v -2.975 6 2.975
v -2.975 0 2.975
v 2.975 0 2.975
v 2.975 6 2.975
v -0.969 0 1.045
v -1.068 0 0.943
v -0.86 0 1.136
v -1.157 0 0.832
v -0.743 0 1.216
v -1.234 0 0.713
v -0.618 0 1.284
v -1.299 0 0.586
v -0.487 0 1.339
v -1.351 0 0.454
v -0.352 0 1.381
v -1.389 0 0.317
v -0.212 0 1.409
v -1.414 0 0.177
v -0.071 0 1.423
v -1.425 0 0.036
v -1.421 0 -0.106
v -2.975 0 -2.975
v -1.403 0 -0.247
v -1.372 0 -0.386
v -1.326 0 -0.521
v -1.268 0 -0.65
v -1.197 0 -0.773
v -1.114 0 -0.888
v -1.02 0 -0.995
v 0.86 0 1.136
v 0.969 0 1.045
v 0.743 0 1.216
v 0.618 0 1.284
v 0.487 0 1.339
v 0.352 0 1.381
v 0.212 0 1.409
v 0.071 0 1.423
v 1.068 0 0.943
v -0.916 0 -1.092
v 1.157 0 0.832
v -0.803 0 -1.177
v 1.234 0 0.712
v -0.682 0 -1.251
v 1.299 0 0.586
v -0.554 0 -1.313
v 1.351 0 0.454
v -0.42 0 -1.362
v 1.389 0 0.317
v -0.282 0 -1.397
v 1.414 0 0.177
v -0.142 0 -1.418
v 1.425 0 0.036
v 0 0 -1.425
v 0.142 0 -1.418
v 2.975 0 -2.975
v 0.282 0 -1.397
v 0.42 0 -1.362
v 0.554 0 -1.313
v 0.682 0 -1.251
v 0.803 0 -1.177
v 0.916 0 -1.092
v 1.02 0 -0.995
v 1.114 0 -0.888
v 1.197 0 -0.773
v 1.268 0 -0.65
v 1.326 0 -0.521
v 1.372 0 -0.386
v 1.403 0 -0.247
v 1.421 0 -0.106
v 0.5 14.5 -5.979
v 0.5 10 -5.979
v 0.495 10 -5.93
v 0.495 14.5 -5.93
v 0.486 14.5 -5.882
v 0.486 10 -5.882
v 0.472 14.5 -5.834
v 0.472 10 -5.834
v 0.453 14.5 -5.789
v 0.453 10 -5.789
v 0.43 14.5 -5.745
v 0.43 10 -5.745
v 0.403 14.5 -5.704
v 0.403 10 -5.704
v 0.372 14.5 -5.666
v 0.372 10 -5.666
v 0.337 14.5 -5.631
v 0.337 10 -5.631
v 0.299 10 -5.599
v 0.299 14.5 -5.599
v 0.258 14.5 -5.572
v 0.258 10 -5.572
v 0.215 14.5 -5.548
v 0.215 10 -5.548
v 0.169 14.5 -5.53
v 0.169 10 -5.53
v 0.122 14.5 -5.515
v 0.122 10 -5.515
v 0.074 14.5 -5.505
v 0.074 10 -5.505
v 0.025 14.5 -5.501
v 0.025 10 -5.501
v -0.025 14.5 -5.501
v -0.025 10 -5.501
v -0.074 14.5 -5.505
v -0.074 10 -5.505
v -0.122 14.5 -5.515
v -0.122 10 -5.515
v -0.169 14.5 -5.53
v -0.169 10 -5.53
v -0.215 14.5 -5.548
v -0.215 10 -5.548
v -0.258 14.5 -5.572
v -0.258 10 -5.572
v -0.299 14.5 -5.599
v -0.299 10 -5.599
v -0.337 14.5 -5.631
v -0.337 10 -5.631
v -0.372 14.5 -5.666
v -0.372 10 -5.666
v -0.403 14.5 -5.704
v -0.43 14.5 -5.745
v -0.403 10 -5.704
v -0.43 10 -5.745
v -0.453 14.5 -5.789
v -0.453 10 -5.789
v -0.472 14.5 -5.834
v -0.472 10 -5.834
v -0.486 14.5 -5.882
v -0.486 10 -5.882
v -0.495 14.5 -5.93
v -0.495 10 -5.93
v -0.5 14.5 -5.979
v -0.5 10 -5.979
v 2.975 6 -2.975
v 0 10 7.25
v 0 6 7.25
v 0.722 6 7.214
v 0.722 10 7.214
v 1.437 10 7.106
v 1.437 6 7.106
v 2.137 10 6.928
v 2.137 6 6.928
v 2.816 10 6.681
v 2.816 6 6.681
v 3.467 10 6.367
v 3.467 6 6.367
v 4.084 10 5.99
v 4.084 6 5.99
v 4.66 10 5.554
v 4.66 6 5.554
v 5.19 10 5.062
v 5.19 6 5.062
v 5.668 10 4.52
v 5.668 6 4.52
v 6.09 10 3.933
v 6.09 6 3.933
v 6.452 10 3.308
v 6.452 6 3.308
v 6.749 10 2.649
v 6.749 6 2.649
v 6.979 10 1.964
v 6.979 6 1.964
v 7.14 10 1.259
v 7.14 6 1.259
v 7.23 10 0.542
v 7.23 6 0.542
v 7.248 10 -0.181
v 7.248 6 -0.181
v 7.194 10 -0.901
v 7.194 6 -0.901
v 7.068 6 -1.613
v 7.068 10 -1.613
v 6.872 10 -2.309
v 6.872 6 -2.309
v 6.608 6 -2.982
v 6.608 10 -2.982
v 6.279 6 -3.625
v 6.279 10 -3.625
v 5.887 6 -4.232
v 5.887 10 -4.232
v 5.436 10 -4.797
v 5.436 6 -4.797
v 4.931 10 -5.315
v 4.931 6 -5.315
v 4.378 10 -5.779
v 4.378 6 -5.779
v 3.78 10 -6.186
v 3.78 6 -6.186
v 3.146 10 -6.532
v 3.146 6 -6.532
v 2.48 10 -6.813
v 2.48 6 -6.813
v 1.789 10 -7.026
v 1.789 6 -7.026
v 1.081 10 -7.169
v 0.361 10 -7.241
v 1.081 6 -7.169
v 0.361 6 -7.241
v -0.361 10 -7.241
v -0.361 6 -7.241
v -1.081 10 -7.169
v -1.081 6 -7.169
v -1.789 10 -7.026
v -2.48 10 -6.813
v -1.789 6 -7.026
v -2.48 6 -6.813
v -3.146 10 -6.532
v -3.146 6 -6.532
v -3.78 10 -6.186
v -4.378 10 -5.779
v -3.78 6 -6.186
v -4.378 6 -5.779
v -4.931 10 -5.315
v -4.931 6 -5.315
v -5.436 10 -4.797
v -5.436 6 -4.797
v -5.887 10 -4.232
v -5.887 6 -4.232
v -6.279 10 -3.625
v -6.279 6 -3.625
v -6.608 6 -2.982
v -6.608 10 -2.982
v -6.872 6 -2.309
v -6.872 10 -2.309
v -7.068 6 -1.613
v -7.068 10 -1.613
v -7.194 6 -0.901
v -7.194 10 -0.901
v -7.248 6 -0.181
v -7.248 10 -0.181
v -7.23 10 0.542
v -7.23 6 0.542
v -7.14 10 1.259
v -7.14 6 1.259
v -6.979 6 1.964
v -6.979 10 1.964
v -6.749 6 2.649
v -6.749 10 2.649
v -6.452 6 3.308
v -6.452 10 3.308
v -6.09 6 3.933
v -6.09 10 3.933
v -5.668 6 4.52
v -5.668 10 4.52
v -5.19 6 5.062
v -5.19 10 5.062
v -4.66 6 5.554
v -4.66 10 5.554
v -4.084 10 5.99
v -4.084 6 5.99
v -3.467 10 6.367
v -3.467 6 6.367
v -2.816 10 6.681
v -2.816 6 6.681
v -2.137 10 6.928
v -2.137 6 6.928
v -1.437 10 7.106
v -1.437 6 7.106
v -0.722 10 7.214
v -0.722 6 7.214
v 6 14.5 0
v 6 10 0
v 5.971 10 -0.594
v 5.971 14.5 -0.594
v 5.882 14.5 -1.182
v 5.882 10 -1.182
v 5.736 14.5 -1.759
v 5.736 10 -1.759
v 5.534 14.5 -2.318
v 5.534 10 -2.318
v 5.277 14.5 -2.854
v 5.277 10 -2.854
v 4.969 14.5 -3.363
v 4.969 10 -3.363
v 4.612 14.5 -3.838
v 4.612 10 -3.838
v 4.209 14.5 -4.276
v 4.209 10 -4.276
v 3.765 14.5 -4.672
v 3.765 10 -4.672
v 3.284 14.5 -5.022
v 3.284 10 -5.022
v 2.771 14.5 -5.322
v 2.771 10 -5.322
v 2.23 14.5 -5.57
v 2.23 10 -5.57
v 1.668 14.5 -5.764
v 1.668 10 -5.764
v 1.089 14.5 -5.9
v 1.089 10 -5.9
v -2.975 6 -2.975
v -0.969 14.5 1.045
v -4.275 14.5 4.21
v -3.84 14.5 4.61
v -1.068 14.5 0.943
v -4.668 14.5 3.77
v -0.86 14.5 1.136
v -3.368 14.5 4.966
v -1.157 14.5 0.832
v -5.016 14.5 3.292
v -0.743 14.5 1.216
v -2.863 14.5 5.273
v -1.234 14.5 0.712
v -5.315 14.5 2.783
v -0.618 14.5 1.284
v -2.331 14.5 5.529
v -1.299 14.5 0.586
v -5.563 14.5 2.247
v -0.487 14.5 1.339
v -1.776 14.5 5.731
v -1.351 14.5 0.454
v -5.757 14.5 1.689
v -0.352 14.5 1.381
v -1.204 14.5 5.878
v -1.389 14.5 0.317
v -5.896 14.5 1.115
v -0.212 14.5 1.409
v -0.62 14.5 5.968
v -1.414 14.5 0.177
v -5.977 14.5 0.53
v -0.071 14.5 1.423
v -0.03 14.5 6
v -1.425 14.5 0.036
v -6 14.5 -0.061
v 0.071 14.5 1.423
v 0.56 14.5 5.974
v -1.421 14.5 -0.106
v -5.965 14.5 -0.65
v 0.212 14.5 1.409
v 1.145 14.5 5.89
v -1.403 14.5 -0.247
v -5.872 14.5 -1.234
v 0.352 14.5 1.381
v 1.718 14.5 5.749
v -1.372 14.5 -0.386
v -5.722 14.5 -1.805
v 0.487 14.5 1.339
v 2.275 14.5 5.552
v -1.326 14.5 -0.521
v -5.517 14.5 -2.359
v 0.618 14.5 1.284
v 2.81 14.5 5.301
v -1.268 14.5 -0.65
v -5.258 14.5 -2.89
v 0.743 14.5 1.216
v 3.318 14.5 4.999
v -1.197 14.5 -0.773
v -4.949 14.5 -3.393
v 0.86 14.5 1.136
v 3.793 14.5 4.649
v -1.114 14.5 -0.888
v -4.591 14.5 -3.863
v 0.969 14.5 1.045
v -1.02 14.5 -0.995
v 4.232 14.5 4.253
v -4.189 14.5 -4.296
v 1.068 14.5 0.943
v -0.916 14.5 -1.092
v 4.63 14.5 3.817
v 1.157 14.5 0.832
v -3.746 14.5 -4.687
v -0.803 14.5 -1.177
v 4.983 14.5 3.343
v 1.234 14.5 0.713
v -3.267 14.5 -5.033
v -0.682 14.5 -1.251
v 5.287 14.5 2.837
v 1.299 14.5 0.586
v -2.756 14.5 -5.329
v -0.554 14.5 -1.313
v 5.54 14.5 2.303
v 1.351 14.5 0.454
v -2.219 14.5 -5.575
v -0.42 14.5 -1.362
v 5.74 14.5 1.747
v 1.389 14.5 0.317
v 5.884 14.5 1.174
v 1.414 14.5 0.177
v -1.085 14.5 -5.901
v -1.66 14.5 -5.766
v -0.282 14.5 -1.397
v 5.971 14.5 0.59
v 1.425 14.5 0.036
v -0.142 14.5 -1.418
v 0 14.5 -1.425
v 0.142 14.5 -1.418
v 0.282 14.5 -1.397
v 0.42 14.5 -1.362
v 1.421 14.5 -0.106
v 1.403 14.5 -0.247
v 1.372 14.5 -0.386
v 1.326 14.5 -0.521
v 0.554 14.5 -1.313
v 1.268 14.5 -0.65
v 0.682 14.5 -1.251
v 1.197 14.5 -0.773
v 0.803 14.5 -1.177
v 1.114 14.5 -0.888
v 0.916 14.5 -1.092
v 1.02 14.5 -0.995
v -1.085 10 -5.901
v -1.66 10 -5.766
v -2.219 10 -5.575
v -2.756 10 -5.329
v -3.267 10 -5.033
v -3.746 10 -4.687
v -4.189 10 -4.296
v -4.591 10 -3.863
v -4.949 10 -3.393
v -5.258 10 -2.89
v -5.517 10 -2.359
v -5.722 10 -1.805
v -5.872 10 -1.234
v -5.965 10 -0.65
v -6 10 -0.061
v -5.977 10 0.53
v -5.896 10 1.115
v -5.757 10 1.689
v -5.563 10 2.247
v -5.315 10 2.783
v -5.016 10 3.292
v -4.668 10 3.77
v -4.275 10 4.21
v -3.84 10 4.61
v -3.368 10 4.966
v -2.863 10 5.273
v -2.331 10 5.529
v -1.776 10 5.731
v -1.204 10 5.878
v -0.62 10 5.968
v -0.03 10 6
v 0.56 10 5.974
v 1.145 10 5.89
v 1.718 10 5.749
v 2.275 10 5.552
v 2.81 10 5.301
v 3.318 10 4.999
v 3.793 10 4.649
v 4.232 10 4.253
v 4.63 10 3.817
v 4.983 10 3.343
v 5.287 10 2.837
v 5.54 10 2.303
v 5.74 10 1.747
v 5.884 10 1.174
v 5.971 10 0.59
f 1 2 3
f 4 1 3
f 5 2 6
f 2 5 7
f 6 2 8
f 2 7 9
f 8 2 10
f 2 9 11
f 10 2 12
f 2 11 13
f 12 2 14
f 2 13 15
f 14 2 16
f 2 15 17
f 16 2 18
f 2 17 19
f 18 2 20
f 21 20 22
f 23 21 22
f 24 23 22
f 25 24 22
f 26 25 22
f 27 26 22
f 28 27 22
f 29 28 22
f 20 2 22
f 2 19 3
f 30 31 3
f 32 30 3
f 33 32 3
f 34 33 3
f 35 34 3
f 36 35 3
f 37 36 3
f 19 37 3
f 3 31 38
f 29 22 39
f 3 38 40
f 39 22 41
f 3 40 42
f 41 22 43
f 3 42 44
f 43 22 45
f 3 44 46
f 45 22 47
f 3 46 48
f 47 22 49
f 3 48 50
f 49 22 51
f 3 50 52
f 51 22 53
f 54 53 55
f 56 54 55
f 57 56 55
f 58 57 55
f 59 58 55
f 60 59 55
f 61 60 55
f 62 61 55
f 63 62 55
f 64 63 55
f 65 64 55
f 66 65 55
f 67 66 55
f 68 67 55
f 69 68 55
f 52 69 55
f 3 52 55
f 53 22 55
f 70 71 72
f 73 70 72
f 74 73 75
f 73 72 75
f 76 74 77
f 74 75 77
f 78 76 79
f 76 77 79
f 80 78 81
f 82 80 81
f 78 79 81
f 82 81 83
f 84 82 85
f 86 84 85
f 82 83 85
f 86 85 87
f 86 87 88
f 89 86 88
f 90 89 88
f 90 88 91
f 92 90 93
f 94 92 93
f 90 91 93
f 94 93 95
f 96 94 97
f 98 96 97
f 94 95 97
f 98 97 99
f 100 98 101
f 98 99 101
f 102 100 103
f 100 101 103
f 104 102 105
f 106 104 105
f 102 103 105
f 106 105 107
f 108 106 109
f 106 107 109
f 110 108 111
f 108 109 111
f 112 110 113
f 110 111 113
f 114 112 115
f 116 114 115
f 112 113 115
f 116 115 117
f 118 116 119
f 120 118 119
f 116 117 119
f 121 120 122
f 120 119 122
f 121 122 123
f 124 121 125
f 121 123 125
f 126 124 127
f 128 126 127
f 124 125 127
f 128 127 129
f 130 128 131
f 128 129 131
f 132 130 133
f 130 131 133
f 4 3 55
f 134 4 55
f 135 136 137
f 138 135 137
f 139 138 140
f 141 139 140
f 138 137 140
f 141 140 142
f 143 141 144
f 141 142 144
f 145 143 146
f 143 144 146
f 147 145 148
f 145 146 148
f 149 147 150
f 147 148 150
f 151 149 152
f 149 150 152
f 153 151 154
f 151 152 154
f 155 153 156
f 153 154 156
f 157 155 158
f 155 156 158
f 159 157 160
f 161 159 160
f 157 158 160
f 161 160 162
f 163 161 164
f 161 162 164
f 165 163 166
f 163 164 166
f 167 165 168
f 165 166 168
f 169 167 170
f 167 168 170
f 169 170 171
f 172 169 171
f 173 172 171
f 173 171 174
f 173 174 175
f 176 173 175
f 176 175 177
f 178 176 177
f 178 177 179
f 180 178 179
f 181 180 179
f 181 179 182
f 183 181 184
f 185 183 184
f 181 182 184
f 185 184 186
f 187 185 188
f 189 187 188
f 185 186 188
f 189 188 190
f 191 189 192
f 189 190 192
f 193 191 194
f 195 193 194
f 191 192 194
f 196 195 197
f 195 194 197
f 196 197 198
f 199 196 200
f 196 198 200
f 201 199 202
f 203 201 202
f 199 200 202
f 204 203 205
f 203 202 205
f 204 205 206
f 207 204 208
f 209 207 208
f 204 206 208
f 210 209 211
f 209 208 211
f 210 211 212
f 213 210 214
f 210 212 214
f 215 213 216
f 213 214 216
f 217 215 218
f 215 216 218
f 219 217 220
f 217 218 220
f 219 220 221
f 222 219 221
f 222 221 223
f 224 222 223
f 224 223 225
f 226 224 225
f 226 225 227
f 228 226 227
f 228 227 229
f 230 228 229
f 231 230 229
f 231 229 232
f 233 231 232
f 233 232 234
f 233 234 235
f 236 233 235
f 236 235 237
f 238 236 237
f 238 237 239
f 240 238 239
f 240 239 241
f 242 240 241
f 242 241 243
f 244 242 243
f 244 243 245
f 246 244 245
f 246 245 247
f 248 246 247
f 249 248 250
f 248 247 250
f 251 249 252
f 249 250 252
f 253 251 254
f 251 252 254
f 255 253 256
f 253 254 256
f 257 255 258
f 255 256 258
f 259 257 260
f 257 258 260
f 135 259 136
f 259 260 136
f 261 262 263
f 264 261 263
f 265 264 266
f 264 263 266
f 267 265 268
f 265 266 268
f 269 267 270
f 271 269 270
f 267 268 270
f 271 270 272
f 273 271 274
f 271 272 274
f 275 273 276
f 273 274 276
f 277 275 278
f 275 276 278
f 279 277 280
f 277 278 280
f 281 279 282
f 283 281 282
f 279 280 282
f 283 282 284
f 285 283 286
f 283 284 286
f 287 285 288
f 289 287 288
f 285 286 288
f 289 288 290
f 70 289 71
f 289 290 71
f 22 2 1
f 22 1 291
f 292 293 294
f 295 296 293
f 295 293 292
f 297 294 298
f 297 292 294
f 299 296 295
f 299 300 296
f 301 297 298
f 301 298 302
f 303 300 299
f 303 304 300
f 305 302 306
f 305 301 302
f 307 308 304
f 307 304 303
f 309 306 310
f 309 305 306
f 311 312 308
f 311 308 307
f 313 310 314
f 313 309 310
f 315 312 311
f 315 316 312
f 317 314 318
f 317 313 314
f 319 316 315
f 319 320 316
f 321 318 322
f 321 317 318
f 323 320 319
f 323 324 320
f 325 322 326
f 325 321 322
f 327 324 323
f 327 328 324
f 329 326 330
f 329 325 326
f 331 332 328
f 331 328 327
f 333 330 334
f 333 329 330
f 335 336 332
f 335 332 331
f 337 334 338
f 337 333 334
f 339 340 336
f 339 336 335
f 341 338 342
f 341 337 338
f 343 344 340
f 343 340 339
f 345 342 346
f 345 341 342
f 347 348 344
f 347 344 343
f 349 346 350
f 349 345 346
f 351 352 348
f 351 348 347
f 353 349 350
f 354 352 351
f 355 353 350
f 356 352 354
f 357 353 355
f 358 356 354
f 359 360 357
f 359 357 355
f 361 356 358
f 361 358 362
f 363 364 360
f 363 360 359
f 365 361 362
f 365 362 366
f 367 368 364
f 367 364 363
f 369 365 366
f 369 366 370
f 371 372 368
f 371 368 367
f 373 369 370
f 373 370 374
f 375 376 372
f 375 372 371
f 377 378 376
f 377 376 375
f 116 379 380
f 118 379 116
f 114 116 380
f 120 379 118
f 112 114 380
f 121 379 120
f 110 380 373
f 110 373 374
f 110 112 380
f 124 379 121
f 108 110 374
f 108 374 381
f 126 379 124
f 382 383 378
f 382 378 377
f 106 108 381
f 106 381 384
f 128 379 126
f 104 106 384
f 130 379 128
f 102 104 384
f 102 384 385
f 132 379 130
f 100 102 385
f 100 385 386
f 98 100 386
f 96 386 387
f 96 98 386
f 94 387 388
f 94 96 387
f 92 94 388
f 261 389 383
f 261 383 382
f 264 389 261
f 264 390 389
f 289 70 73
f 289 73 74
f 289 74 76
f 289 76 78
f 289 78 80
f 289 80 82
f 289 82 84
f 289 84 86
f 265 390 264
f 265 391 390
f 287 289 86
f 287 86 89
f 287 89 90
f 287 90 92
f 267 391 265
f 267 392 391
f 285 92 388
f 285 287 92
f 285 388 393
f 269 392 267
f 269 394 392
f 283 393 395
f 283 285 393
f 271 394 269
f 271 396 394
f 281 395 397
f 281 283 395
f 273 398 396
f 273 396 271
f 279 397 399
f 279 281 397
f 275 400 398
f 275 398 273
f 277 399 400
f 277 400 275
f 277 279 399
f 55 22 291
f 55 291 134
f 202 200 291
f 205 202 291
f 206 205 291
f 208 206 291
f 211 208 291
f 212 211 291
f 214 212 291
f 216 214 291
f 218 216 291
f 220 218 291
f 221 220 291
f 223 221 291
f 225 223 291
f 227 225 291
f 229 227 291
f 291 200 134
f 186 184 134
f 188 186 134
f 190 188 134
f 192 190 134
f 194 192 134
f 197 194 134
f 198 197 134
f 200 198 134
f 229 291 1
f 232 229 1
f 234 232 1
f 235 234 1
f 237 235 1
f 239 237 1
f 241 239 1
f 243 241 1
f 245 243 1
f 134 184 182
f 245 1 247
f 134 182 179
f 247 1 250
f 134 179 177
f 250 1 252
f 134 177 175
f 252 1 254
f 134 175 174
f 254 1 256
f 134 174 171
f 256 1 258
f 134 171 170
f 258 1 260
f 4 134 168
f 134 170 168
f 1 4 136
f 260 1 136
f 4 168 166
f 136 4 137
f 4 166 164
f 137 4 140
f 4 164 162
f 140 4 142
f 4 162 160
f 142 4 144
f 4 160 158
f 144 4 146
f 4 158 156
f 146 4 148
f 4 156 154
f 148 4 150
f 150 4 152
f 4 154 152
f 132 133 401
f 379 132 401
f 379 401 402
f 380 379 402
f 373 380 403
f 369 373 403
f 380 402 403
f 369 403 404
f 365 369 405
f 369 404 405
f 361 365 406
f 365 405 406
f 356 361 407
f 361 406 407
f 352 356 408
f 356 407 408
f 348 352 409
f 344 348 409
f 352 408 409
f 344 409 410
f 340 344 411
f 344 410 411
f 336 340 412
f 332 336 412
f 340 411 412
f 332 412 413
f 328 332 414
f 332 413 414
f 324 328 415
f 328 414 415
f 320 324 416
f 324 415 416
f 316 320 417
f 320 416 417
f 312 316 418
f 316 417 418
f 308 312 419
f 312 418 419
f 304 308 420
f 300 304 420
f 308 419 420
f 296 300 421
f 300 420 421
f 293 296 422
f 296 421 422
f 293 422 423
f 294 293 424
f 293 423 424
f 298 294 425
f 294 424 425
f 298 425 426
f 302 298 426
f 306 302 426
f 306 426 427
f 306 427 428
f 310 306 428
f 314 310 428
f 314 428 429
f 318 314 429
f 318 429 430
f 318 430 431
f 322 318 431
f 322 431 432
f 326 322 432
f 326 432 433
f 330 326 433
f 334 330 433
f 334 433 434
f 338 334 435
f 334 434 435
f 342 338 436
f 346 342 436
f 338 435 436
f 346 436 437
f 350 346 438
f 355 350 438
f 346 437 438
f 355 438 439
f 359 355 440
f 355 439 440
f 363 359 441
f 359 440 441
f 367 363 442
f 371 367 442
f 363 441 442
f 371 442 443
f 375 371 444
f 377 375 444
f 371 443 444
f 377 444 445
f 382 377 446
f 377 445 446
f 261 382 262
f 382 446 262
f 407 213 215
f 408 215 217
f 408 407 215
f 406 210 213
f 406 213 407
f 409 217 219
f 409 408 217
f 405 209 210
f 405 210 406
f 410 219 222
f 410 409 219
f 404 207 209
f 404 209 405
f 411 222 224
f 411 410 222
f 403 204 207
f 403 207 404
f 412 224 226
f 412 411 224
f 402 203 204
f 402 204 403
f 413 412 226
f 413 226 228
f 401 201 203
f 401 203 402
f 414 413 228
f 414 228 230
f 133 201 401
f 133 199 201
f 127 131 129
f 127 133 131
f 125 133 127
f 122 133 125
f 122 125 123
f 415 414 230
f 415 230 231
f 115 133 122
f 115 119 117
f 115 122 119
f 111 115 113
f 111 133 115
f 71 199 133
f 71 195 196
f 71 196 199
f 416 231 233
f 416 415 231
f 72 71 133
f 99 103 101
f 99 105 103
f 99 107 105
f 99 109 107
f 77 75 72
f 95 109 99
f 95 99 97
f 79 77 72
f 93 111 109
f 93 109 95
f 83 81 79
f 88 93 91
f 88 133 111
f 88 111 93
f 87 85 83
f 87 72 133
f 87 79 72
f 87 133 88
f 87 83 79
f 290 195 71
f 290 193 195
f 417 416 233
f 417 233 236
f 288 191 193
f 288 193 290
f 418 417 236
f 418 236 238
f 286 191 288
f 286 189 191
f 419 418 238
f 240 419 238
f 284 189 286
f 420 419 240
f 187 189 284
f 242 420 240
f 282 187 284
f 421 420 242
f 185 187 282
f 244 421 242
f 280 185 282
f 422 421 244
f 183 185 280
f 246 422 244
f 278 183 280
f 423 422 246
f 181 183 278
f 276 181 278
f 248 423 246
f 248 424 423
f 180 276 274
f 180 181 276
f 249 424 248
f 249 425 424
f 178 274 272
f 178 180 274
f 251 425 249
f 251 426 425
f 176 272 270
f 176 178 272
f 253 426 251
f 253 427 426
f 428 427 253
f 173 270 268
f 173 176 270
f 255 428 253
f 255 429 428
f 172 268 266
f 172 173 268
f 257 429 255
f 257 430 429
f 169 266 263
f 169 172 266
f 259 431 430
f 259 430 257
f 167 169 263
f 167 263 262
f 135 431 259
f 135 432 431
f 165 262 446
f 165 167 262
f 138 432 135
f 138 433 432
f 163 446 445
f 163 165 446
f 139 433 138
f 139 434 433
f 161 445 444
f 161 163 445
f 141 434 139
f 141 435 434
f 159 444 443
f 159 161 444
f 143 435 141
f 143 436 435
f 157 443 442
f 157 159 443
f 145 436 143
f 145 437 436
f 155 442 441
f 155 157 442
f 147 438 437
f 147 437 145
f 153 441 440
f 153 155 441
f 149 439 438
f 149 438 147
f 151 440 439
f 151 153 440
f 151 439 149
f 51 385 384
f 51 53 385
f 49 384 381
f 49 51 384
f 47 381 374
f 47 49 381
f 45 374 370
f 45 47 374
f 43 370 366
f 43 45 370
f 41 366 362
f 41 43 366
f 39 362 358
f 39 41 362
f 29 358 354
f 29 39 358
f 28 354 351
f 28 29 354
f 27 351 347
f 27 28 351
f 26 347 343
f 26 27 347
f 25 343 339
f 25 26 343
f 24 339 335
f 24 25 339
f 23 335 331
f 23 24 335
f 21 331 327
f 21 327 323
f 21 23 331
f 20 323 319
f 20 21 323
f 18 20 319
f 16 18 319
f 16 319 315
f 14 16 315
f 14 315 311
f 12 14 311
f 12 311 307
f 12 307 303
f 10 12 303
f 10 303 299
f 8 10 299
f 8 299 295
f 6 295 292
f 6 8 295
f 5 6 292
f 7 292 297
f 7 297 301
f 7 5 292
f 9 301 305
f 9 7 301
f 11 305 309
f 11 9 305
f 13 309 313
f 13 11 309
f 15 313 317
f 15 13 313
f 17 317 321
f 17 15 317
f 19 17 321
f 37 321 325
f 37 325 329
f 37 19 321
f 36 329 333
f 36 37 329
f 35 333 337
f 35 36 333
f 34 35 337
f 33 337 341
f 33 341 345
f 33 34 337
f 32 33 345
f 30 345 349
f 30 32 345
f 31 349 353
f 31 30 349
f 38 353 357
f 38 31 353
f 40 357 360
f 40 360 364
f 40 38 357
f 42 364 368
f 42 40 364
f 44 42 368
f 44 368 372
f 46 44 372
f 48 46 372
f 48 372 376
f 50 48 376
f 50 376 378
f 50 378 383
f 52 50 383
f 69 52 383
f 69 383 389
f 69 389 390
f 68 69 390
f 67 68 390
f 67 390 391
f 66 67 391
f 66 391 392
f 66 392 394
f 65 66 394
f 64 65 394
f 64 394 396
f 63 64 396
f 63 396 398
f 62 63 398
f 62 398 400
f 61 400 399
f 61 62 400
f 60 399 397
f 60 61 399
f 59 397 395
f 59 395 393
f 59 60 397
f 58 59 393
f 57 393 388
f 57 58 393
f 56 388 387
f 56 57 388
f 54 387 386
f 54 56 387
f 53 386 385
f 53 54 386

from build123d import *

# Parameters (mm, degrees)
SKETCH1_W           = 5.95
SKETCH1_H           = 5.95
BOSS_EXTRUDE1_DEPTH = 6
SKETCH2_R           = 7.25
BOSS_EXTRUDE2_DEPTH = 4
SKETCH3_R           = 1.425
CUT_EXTRUDE1_DEPTH  = 15.322185587
SKETCH4_R           = 1.425
BOSS_EXTRUDE4_DEPTH = 4.5


with BuildPart() as part:
    # Sketch1 → Boss-Extrude1 (new body)
    with BuildSketch(Plane(origin=(0, 0, 0), x_dir=(1, 0, 0), z_dir=(0, 1, 0))):
        Rectangle(SKETCH1_W, SKETCH1_H)
    extrude(amount=BOSS_EXTRUDE1_DEPTH)

    # Sketch2 → Boss-Extrude2 (add)
    with BuildSketch(Plane(origin=(0, 6, 0), x_dir=(1, 0, 0), z_dir=(0, 1, 0))):
        with Locations(Location((0, 0, 0), (0, 0, 270))):
            Circle(SKETCH2_R)
    extrude(amount=BOSS_EXTRUDE2_DEPTH)

    # Sketch3 → Cut-Extrude1 (cut, through all)
    with BuildSketch(Plane.XZ):
        with Locations(Location((0, 0, 0), (0, 0, 270))):
            Circle(SKETCH3_R)
    extrude(amount=-CUT_EXTRUDE1_DEPTH, mode=Mode.SUBTRACT)

    # Sketch4 → Boss-Extrude4 (add)
    with BuildSketch(Plane(origin=(0, 10, 0), x_dir=(1, 0, 0), z_dir=(0, 1, 0))):
        with BuildLine():
            ThreePointArc((-0.499565784, 5.979166667), (-4.062179544, -4.415732935), (6, 0))
            ThreePointArc((6, 0), (4.415732935, 4.062179544), (0.499565784, 5.979166667))
            ThreePointArc((0.499565784, 5.979166667), (0, 5.5), (-0.499565784, 5.979166667))
        make_face()
        with Locations(Location((0, 0, 0), (0, 0, 90))):
            Circle(SKETCH4_R, mode=Mode.SUBTRACT)
    extrude(amount=BOSS_EXTRUDE4_DEPTH)


solid = part.part
